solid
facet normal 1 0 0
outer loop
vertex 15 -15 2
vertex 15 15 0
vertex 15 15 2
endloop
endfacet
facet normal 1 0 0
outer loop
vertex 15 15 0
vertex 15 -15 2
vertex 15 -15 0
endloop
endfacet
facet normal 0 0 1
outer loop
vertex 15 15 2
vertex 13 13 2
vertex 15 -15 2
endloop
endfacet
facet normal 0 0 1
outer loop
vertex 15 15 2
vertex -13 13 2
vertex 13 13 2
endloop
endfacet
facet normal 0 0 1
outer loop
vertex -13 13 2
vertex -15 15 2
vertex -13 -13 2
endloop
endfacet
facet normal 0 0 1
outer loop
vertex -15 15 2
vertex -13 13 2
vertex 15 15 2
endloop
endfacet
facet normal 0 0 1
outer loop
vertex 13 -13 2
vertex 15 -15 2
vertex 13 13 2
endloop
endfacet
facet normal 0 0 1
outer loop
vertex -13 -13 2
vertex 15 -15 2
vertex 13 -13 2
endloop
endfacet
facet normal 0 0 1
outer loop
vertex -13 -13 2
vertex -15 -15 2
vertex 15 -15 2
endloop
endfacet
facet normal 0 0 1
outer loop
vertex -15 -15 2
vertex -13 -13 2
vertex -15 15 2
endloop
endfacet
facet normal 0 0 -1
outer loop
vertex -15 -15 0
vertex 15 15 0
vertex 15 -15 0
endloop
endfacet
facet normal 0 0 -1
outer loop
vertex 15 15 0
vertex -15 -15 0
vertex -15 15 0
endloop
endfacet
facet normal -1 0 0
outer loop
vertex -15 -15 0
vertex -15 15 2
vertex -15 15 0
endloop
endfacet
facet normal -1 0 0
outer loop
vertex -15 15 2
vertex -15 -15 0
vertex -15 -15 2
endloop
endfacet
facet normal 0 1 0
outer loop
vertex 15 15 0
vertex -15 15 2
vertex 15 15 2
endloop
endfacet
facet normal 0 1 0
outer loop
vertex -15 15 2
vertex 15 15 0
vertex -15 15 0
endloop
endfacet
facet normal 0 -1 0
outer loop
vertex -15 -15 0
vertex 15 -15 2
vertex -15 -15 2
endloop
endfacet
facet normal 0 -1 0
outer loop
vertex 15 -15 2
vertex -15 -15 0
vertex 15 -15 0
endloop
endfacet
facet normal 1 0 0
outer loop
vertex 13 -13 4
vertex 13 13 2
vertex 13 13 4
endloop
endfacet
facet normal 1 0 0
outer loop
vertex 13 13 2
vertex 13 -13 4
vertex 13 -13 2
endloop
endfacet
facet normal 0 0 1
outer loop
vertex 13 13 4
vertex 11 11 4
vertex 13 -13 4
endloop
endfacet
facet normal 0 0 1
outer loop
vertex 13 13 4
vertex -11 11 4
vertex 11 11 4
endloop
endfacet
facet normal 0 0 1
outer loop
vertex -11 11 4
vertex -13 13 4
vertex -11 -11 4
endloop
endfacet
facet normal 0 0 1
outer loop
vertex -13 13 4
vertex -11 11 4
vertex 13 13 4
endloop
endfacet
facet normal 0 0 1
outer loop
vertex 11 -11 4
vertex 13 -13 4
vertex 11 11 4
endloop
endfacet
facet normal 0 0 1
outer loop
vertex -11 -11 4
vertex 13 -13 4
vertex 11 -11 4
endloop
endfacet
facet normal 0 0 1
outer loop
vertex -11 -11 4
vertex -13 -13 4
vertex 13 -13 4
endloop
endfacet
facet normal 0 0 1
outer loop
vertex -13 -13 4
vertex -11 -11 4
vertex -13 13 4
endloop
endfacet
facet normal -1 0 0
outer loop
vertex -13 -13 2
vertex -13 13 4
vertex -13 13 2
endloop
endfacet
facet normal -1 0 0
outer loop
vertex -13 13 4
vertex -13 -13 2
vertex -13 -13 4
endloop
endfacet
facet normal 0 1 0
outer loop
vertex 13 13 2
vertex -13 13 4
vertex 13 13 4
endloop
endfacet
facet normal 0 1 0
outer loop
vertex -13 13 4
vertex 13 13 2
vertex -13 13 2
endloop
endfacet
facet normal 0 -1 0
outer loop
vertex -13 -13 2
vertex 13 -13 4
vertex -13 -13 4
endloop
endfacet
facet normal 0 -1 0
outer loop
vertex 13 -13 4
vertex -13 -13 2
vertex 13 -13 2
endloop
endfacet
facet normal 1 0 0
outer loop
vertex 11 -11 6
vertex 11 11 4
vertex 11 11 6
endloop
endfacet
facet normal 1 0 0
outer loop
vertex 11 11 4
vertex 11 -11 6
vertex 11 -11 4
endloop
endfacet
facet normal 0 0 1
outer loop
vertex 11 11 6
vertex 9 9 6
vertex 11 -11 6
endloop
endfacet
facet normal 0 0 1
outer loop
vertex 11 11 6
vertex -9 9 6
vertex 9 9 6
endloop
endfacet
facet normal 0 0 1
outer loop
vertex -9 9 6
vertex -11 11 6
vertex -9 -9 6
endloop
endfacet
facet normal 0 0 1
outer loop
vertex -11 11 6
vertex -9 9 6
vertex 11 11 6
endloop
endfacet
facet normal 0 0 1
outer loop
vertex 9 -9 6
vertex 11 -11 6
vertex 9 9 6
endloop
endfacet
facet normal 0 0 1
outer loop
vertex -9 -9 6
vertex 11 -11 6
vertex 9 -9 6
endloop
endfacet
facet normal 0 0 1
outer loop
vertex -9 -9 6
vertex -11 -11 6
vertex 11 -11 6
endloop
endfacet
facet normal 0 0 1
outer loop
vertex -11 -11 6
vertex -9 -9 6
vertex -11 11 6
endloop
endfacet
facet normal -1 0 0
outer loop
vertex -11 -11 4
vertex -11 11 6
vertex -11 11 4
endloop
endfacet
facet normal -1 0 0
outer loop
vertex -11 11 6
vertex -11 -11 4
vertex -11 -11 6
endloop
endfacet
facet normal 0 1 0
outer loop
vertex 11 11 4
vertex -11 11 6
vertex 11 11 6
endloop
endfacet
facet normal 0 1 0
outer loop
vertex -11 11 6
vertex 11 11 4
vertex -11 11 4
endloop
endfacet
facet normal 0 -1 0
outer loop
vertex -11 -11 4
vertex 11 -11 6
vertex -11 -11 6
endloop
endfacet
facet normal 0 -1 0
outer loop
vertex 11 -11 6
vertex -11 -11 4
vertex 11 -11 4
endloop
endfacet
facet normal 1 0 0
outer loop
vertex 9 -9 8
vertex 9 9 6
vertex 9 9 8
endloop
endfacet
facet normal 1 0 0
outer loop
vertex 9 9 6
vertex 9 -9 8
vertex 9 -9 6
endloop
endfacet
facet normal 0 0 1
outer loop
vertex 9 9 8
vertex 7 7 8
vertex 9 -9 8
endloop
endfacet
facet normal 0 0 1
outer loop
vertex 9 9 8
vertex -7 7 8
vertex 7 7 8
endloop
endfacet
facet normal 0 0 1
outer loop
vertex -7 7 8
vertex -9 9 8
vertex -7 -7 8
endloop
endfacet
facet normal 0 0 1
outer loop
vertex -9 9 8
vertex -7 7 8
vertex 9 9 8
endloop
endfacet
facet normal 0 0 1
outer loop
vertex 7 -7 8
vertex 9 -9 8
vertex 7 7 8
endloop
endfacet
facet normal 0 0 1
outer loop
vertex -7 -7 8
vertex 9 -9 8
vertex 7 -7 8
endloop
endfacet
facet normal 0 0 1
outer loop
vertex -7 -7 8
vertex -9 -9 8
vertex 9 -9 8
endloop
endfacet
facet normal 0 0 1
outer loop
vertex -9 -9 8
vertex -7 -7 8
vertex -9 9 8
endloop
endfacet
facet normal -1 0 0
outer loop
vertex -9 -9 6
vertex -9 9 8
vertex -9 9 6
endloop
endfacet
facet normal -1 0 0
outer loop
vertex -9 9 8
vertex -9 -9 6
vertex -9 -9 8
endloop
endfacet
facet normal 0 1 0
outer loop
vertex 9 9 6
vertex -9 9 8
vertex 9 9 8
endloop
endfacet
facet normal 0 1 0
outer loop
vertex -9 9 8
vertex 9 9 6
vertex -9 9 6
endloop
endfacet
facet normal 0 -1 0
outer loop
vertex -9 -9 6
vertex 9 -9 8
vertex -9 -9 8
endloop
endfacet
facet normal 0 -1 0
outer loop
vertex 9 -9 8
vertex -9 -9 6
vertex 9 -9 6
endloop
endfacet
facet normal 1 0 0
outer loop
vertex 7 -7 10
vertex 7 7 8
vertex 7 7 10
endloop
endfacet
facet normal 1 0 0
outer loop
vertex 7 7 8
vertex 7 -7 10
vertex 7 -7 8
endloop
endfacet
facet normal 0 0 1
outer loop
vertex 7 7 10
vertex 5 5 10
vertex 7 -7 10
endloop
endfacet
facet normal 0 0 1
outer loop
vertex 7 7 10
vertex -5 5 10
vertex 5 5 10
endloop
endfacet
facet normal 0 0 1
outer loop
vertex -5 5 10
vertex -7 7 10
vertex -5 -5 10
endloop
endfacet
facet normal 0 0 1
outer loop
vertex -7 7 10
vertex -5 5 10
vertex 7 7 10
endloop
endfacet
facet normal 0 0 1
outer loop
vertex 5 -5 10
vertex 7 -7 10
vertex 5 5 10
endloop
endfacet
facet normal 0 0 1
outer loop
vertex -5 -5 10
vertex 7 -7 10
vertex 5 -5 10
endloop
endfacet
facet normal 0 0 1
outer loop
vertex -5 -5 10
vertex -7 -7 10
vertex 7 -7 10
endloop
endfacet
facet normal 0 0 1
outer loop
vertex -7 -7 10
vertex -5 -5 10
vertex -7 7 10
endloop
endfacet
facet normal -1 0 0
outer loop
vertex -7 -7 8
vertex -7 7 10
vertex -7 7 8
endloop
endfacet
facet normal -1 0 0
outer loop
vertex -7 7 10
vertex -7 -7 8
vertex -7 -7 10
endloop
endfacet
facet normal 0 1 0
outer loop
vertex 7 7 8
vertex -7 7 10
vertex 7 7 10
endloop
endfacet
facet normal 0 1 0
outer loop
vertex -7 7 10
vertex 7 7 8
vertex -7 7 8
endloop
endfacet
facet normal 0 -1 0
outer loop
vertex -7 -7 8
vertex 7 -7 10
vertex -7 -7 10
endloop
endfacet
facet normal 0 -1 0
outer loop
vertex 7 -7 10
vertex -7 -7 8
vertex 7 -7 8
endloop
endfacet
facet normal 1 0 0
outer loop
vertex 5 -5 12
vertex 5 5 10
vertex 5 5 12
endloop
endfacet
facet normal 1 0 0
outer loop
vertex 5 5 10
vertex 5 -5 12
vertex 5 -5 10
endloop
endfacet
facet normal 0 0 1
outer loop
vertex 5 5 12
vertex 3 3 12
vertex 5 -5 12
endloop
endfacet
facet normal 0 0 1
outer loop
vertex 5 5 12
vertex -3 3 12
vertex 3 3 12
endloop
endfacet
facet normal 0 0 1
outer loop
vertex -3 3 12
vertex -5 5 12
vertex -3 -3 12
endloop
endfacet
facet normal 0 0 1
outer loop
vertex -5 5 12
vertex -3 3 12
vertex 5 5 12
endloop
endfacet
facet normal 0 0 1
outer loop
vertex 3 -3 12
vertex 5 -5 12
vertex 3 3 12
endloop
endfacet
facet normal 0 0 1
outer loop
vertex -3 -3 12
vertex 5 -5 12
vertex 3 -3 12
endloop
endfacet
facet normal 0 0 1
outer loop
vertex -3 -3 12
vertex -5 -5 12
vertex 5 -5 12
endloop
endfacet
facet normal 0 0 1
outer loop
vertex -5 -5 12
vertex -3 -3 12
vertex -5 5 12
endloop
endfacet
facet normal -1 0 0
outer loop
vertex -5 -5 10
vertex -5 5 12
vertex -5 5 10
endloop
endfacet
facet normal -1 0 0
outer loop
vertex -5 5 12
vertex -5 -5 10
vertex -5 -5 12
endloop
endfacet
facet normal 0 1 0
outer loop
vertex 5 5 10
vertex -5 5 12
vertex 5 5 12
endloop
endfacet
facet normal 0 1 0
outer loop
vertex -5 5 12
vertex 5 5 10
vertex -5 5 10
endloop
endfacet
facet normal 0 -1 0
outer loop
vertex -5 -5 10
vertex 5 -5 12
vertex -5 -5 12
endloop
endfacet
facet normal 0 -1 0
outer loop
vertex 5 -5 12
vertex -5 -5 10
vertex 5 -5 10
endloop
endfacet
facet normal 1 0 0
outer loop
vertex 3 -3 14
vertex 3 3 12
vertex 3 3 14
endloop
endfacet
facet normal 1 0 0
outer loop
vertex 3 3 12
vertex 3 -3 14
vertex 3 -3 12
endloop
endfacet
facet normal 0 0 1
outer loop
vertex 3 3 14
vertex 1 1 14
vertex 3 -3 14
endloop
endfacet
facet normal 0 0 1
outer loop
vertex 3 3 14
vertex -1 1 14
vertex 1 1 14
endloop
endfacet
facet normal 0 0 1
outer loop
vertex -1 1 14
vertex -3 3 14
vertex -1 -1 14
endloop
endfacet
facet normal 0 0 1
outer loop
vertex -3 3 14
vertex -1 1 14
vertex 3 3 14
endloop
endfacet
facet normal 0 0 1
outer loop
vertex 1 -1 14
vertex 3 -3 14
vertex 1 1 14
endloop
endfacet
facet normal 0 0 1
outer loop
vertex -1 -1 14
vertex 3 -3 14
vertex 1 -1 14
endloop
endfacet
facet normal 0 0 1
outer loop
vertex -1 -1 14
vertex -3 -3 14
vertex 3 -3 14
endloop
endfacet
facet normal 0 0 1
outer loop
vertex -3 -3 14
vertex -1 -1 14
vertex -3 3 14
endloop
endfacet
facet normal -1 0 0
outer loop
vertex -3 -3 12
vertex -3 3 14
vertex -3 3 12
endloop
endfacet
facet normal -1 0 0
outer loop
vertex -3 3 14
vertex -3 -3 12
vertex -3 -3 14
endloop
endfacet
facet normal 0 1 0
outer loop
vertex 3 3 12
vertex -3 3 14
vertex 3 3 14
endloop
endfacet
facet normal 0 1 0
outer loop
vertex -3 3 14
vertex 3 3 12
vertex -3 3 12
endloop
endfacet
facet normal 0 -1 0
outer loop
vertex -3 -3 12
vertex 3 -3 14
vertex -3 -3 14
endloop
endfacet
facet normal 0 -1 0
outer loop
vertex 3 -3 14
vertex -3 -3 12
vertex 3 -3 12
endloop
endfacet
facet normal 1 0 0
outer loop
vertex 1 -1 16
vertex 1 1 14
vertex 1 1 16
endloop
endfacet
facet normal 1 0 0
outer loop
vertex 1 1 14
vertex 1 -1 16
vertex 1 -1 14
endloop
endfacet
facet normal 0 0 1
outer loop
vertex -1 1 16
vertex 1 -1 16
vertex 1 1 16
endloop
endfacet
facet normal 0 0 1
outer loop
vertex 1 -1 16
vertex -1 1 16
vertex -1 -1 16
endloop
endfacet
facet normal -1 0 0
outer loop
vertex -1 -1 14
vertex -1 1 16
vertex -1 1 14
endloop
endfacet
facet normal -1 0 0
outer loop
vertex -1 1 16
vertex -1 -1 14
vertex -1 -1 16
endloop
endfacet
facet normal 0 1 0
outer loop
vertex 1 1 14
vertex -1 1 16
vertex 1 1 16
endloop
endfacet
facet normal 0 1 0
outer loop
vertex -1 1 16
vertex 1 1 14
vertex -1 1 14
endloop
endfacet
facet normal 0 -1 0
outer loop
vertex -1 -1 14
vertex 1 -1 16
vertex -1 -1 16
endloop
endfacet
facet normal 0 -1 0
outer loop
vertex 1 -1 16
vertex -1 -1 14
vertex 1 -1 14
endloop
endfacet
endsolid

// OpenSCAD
  for (y=[0:2:20]) {
      translate([0,0,y+1])
          cube([30-2*y,30-2*y,2], true);
  }
